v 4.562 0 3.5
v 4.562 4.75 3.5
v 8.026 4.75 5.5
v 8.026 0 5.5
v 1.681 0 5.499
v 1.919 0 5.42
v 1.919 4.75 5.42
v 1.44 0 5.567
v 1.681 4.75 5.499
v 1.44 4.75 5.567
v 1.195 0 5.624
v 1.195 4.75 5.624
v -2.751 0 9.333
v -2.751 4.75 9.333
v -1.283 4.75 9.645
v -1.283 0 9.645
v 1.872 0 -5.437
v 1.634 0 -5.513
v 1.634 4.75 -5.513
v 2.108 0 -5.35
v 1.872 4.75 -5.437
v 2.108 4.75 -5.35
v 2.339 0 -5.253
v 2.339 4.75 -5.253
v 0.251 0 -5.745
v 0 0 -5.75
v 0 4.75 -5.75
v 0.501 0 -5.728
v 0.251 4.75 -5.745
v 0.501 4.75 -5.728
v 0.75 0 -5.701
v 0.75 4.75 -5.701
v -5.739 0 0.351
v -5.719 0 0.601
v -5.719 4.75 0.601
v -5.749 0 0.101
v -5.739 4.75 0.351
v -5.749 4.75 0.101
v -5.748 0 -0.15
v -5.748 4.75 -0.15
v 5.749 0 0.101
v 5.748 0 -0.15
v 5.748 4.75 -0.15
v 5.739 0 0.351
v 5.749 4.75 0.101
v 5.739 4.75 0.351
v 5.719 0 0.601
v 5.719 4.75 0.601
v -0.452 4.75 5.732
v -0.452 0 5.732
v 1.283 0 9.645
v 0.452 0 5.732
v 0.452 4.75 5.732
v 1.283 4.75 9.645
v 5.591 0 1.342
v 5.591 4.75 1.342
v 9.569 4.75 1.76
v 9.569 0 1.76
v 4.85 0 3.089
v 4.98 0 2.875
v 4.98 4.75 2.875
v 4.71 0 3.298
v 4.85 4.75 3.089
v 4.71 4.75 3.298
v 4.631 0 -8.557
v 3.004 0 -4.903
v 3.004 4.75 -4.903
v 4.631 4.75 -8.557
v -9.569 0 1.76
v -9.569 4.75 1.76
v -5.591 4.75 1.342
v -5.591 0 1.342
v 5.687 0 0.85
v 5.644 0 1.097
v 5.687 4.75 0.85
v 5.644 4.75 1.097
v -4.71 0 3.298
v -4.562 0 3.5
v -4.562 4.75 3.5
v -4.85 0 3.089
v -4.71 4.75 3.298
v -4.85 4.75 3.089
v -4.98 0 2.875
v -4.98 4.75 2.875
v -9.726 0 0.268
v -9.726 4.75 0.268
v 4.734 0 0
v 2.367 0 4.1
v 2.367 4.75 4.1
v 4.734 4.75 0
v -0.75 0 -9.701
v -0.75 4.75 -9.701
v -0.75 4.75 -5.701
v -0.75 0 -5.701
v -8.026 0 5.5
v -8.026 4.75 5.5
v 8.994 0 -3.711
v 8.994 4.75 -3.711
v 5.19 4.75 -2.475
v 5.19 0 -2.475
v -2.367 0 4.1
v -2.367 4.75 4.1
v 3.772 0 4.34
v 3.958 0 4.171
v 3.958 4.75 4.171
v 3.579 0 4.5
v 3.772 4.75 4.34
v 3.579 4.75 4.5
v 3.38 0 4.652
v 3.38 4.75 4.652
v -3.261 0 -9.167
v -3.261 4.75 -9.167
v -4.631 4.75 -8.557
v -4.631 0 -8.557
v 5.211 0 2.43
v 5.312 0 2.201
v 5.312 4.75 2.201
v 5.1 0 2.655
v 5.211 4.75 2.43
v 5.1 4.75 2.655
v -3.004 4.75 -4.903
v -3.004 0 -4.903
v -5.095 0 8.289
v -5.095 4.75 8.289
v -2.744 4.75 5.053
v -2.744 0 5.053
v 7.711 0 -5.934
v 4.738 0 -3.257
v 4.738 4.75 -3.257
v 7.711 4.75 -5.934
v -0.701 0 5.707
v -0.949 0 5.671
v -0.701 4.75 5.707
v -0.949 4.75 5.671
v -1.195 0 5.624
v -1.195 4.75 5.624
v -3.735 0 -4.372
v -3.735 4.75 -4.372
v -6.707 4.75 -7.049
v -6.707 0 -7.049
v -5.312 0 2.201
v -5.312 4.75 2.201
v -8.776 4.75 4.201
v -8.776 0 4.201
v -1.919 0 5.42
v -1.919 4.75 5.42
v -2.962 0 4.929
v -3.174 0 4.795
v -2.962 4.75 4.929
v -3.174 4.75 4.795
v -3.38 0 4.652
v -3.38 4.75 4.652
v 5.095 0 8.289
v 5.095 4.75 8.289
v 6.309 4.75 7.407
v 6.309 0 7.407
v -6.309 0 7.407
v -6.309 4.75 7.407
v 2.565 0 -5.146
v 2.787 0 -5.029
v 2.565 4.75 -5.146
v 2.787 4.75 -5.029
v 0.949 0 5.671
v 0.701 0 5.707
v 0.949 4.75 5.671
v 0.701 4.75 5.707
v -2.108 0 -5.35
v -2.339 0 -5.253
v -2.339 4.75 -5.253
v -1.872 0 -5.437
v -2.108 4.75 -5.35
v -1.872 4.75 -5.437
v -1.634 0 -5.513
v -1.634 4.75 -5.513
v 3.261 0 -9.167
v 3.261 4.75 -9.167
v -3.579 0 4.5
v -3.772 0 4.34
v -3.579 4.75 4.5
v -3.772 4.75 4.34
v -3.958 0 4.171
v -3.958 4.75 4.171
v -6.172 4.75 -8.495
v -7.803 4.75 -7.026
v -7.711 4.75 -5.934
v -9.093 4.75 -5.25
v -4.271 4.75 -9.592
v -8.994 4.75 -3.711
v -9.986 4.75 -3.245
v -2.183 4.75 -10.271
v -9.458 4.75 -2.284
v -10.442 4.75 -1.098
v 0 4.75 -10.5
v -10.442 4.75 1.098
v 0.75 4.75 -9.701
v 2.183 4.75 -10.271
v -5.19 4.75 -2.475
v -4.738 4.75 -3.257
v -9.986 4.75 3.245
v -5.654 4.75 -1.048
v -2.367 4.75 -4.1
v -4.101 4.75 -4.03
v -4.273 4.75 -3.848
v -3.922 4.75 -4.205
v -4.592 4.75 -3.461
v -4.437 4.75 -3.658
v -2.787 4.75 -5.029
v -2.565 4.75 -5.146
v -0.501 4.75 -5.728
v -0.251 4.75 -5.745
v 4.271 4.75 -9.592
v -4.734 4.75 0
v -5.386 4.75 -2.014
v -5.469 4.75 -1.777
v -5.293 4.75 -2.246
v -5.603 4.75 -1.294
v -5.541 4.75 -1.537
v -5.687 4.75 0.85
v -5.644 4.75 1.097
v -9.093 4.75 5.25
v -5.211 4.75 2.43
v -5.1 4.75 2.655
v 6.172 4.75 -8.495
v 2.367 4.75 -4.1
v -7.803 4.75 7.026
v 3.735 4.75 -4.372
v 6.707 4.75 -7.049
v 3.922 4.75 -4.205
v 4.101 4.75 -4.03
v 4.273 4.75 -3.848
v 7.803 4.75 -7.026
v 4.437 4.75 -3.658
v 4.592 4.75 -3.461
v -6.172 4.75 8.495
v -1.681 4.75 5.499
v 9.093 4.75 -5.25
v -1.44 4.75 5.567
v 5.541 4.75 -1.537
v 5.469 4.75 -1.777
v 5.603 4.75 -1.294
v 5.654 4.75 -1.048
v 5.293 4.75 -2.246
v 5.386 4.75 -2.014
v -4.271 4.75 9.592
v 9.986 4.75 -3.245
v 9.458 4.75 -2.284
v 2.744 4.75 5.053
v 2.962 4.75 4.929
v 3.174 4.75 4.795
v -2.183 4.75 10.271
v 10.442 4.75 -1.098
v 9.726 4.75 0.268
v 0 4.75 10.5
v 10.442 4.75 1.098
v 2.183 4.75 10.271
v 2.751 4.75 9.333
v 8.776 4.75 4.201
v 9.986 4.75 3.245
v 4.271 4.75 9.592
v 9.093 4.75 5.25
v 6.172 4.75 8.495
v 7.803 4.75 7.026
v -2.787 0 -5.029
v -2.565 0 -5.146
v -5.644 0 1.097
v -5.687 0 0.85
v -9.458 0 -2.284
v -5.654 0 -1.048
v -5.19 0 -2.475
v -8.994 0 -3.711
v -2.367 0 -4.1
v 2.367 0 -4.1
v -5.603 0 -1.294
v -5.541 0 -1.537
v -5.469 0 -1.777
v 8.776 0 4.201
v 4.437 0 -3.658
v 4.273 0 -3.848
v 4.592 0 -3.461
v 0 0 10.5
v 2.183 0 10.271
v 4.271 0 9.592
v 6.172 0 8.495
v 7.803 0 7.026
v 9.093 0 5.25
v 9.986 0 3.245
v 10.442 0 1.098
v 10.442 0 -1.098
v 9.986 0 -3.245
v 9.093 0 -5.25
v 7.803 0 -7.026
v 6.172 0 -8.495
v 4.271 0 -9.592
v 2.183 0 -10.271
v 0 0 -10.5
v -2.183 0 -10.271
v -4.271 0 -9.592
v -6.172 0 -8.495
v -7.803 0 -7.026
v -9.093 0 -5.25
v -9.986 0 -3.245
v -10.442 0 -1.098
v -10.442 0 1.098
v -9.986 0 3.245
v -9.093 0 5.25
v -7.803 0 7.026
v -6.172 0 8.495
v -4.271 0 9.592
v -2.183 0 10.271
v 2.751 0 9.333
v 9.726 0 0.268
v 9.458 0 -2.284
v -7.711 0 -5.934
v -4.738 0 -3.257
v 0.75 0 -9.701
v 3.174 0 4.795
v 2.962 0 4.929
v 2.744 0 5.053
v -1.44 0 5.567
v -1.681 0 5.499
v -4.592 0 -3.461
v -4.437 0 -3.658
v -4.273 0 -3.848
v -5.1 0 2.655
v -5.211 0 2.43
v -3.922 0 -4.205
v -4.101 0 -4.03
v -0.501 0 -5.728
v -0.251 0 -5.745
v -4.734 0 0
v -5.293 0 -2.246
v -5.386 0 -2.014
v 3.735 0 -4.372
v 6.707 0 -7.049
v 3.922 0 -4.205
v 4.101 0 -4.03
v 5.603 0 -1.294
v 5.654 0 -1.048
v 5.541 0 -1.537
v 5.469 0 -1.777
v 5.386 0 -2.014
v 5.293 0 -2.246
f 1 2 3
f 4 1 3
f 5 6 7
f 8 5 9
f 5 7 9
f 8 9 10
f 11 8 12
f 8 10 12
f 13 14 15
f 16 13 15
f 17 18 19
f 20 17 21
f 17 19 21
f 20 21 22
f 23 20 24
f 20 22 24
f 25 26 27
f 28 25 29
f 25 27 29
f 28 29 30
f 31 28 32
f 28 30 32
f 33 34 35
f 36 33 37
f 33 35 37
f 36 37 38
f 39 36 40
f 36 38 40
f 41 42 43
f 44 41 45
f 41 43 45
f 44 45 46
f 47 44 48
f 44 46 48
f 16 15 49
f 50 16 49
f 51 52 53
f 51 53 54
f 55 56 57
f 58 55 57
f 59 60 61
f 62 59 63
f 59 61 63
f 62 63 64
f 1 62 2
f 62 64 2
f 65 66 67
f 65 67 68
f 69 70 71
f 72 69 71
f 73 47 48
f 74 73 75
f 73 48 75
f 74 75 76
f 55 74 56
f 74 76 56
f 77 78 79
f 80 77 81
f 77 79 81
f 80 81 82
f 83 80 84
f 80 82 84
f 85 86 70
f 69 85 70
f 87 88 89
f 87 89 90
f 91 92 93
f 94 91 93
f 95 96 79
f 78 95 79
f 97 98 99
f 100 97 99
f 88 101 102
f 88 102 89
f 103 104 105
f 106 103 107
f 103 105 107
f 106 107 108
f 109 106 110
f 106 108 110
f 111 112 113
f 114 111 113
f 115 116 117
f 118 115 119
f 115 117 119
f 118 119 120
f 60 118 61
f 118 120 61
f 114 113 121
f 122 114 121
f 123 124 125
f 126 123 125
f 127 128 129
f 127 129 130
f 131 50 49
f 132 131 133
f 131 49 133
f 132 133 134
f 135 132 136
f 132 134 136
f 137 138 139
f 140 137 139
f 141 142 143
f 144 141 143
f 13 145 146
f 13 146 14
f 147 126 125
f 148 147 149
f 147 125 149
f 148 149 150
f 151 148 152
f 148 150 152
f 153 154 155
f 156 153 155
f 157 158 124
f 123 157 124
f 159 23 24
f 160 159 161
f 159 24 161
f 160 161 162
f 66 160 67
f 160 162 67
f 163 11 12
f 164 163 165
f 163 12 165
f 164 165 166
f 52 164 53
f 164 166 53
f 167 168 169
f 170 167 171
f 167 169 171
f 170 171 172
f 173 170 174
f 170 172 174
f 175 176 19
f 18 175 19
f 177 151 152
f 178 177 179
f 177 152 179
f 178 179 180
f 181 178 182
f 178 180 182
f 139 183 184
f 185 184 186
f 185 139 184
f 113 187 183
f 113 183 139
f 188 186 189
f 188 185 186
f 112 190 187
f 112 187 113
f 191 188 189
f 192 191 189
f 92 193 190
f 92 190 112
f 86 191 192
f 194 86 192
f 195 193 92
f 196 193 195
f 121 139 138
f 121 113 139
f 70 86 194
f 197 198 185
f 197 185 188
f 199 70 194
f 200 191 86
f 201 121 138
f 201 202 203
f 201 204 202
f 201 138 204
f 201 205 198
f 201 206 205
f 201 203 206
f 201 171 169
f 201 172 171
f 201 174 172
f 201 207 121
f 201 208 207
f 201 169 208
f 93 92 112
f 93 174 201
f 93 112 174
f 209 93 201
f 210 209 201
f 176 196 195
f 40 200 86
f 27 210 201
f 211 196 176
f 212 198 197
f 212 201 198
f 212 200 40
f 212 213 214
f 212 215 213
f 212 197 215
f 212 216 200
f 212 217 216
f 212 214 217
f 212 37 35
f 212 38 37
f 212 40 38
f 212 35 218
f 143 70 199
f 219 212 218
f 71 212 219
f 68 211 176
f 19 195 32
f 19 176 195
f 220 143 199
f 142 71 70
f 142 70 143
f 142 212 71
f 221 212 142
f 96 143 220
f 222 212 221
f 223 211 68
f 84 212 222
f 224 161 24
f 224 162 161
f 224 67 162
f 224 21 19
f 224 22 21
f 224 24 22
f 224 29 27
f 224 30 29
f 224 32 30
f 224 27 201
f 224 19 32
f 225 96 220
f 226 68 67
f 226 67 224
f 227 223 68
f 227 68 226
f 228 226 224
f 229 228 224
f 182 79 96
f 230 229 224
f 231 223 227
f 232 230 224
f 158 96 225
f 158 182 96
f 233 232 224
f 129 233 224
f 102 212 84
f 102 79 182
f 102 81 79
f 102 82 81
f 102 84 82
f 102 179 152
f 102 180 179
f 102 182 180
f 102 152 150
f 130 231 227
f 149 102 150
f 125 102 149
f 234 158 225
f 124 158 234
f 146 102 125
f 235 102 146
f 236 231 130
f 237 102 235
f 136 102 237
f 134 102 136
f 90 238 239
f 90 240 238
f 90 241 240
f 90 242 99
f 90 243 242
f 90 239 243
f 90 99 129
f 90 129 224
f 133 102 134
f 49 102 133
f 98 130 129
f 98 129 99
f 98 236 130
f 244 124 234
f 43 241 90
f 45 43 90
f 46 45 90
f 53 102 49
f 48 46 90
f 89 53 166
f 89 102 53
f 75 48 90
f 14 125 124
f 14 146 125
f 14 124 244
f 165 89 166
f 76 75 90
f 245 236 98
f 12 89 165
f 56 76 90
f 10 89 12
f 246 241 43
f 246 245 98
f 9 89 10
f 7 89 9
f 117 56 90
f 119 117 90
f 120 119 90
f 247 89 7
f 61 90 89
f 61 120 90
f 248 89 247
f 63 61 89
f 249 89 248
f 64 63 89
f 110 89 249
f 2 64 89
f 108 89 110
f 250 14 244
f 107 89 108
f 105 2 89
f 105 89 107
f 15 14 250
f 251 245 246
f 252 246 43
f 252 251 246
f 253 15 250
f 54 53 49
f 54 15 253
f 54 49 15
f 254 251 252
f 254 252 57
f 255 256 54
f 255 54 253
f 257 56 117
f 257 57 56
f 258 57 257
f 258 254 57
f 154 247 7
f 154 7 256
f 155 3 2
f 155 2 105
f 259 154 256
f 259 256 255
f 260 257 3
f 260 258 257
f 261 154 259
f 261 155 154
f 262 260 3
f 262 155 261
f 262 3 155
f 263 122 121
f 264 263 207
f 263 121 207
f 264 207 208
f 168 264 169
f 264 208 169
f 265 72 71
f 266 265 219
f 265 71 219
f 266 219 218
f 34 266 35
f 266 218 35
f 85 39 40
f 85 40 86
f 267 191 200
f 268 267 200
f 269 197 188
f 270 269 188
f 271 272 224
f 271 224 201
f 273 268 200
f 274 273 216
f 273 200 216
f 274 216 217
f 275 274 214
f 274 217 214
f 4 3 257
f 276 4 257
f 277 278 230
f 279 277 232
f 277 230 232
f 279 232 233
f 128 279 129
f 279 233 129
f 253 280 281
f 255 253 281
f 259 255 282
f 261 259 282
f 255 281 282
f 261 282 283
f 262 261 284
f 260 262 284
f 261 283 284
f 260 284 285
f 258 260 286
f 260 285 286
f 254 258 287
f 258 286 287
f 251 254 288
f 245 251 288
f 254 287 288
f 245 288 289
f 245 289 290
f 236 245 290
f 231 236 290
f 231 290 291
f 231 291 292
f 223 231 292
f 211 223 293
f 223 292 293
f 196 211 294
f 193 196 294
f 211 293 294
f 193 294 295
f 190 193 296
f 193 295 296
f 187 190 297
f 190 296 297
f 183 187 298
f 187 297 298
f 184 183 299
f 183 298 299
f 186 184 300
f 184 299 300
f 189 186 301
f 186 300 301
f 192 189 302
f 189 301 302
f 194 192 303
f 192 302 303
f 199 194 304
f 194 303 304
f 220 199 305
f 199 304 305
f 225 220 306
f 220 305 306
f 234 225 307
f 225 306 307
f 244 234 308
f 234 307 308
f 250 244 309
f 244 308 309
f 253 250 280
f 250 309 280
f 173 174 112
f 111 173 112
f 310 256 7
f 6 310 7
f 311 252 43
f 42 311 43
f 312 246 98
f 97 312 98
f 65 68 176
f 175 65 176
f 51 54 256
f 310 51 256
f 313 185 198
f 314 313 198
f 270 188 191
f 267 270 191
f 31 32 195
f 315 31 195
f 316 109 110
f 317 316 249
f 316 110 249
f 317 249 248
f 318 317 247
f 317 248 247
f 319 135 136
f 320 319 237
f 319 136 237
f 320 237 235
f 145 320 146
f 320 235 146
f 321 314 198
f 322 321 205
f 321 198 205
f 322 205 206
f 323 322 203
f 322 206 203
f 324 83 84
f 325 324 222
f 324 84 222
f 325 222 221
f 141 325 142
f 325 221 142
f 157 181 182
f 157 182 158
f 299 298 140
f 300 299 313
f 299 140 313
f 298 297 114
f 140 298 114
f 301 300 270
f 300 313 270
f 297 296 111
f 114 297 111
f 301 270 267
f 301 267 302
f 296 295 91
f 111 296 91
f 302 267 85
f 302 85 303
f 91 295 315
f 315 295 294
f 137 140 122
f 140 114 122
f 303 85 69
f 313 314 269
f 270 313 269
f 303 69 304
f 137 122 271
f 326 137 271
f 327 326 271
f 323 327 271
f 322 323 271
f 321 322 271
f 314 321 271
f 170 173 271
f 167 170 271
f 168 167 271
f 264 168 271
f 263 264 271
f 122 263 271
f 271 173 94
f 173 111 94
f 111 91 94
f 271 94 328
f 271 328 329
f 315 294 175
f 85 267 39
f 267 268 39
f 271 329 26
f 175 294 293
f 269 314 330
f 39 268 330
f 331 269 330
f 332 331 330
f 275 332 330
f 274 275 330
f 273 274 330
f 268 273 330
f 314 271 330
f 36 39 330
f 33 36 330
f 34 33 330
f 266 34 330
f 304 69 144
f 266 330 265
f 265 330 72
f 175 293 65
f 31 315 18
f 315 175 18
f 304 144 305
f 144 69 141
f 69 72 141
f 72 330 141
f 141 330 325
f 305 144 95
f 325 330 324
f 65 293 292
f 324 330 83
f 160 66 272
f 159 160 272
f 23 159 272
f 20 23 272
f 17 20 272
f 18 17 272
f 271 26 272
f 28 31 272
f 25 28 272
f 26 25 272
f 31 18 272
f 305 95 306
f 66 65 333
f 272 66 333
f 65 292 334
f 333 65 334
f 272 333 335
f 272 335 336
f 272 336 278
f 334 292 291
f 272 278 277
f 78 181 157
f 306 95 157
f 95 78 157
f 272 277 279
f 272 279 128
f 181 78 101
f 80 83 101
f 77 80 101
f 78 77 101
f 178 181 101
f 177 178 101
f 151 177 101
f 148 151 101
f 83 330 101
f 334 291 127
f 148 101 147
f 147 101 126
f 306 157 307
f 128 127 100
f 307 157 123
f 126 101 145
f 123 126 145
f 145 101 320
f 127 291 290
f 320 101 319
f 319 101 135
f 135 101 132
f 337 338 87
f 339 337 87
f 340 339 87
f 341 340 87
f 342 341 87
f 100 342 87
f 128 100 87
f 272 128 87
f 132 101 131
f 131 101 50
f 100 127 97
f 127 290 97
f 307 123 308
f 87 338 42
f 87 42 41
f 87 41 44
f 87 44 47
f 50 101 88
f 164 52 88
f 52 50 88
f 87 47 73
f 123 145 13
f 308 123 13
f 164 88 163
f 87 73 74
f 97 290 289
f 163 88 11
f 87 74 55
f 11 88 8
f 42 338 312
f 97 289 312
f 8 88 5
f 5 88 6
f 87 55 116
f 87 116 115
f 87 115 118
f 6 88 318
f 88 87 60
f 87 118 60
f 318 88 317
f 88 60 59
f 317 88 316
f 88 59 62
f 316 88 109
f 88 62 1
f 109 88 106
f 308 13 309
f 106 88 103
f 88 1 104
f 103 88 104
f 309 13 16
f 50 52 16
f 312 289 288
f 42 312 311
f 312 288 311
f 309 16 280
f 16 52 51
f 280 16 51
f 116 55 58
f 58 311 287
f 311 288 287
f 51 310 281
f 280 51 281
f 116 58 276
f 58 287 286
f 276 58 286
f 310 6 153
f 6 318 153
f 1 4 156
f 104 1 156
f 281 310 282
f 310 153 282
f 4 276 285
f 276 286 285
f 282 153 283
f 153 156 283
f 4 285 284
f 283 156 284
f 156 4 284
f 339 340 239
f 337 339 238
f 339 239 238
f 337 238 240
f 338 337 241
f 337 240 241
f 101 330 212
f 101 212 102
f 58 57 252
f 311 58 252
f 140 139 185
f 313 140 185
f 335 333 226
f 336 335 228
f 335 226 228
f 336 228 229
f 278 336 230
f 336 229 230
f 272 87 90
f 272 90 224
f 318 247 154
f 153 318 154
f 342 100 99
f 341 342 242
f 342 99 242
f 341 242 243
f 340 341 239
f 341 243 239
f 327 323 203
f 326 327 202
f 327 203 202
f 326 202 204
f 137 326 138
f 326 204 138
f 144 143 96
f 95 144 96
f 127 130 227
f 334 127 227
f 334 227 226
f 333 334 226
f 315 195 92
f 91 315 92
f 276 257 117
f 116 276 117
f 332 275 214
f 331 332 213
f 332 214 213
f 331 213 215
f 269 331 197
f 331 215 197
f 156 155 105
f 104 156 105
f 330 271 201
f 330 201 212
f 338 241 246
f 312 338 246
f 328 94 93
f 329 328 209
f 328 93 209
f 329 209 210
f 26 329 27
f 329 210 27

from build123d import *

# Parameters (mm, degrees)
SKETCH1_R           = 10.5
BOSS_EXTRUDE1_DEPTH = 4.75
CUT_EXTRUDE1_DEPTH  = 5
CIRPATTERN1_COUNT   = 15


with BuildPart() as part:
    # Sketch1 → Boss-Extrude1 (new body)
    with BuildSketch(Plane(origin=(0, 0, 0), x_dir=(1, 0, 0), z_dir=(0, 1, 0))):
        with Locations(Location((0, 0, 0), (0, 0, 270))):
            Circle(SKETCH1_R)
        Polygon((4.734272207, 0), (2.367136104, 4.1), (-2.367136104, 4.1), (-4.734272207, 0), (-2.367136104, -4.1), (2.367136104, -4.1), align=None, mode=Mode.SUBTRACT)
    extrude(amount=BOSS_EXTRUDE1_DEPTH)

    # Sketch2 → Cut-Extrude1 (cut)
    with BuildSketch(Plane(origin=(0, 4.75, 0), x_dir=(1, 0, 0), z_dir=(0, 1, 0))):
        with BuildLine():
            Line((0, 5.75), (0, 9.700877125))
            Line((0, 9.700877125), (-0.75, 9.700877125))
            Line((-0.75, 9.700877125), (-0.75, 5.700877125))
            ThreePointArc((-0.75, 5.700877125), (-0.375803491, 5.737706139), (0, 5.75))
        make_face()
        with BuildLine():
            Line((0.75, 9.700877125), (0, 9.700877125))
            Line((0, 9.700877125), (0, 5.75))
            ThreePointArc((0, 5.75), (0.375803491, 5.737706139), (0.75, 5.700877125))
            Line((0.75, 5.700877125), (0.75, 9.700877125))
        make_face()
    cut_extrude1 = extrude(amount=-CUT_EXTRUDE1_DEPTH, mode=Mode.SUBTRACT)

    # CirPattern1: Cut-Extrude1 ×15 about axis
    cirpattern1_axis = Axis((0, 0, 0), (0, 1, 0))
    for i in range(1, CIRPATTERN1_COUNT):
        add(cut_extrude1.rotate(cirpattern1_axis, i * 360 / CIRPATTERN1_COUNT), mode=Mode.SUBTRACT)


solid = part.part
